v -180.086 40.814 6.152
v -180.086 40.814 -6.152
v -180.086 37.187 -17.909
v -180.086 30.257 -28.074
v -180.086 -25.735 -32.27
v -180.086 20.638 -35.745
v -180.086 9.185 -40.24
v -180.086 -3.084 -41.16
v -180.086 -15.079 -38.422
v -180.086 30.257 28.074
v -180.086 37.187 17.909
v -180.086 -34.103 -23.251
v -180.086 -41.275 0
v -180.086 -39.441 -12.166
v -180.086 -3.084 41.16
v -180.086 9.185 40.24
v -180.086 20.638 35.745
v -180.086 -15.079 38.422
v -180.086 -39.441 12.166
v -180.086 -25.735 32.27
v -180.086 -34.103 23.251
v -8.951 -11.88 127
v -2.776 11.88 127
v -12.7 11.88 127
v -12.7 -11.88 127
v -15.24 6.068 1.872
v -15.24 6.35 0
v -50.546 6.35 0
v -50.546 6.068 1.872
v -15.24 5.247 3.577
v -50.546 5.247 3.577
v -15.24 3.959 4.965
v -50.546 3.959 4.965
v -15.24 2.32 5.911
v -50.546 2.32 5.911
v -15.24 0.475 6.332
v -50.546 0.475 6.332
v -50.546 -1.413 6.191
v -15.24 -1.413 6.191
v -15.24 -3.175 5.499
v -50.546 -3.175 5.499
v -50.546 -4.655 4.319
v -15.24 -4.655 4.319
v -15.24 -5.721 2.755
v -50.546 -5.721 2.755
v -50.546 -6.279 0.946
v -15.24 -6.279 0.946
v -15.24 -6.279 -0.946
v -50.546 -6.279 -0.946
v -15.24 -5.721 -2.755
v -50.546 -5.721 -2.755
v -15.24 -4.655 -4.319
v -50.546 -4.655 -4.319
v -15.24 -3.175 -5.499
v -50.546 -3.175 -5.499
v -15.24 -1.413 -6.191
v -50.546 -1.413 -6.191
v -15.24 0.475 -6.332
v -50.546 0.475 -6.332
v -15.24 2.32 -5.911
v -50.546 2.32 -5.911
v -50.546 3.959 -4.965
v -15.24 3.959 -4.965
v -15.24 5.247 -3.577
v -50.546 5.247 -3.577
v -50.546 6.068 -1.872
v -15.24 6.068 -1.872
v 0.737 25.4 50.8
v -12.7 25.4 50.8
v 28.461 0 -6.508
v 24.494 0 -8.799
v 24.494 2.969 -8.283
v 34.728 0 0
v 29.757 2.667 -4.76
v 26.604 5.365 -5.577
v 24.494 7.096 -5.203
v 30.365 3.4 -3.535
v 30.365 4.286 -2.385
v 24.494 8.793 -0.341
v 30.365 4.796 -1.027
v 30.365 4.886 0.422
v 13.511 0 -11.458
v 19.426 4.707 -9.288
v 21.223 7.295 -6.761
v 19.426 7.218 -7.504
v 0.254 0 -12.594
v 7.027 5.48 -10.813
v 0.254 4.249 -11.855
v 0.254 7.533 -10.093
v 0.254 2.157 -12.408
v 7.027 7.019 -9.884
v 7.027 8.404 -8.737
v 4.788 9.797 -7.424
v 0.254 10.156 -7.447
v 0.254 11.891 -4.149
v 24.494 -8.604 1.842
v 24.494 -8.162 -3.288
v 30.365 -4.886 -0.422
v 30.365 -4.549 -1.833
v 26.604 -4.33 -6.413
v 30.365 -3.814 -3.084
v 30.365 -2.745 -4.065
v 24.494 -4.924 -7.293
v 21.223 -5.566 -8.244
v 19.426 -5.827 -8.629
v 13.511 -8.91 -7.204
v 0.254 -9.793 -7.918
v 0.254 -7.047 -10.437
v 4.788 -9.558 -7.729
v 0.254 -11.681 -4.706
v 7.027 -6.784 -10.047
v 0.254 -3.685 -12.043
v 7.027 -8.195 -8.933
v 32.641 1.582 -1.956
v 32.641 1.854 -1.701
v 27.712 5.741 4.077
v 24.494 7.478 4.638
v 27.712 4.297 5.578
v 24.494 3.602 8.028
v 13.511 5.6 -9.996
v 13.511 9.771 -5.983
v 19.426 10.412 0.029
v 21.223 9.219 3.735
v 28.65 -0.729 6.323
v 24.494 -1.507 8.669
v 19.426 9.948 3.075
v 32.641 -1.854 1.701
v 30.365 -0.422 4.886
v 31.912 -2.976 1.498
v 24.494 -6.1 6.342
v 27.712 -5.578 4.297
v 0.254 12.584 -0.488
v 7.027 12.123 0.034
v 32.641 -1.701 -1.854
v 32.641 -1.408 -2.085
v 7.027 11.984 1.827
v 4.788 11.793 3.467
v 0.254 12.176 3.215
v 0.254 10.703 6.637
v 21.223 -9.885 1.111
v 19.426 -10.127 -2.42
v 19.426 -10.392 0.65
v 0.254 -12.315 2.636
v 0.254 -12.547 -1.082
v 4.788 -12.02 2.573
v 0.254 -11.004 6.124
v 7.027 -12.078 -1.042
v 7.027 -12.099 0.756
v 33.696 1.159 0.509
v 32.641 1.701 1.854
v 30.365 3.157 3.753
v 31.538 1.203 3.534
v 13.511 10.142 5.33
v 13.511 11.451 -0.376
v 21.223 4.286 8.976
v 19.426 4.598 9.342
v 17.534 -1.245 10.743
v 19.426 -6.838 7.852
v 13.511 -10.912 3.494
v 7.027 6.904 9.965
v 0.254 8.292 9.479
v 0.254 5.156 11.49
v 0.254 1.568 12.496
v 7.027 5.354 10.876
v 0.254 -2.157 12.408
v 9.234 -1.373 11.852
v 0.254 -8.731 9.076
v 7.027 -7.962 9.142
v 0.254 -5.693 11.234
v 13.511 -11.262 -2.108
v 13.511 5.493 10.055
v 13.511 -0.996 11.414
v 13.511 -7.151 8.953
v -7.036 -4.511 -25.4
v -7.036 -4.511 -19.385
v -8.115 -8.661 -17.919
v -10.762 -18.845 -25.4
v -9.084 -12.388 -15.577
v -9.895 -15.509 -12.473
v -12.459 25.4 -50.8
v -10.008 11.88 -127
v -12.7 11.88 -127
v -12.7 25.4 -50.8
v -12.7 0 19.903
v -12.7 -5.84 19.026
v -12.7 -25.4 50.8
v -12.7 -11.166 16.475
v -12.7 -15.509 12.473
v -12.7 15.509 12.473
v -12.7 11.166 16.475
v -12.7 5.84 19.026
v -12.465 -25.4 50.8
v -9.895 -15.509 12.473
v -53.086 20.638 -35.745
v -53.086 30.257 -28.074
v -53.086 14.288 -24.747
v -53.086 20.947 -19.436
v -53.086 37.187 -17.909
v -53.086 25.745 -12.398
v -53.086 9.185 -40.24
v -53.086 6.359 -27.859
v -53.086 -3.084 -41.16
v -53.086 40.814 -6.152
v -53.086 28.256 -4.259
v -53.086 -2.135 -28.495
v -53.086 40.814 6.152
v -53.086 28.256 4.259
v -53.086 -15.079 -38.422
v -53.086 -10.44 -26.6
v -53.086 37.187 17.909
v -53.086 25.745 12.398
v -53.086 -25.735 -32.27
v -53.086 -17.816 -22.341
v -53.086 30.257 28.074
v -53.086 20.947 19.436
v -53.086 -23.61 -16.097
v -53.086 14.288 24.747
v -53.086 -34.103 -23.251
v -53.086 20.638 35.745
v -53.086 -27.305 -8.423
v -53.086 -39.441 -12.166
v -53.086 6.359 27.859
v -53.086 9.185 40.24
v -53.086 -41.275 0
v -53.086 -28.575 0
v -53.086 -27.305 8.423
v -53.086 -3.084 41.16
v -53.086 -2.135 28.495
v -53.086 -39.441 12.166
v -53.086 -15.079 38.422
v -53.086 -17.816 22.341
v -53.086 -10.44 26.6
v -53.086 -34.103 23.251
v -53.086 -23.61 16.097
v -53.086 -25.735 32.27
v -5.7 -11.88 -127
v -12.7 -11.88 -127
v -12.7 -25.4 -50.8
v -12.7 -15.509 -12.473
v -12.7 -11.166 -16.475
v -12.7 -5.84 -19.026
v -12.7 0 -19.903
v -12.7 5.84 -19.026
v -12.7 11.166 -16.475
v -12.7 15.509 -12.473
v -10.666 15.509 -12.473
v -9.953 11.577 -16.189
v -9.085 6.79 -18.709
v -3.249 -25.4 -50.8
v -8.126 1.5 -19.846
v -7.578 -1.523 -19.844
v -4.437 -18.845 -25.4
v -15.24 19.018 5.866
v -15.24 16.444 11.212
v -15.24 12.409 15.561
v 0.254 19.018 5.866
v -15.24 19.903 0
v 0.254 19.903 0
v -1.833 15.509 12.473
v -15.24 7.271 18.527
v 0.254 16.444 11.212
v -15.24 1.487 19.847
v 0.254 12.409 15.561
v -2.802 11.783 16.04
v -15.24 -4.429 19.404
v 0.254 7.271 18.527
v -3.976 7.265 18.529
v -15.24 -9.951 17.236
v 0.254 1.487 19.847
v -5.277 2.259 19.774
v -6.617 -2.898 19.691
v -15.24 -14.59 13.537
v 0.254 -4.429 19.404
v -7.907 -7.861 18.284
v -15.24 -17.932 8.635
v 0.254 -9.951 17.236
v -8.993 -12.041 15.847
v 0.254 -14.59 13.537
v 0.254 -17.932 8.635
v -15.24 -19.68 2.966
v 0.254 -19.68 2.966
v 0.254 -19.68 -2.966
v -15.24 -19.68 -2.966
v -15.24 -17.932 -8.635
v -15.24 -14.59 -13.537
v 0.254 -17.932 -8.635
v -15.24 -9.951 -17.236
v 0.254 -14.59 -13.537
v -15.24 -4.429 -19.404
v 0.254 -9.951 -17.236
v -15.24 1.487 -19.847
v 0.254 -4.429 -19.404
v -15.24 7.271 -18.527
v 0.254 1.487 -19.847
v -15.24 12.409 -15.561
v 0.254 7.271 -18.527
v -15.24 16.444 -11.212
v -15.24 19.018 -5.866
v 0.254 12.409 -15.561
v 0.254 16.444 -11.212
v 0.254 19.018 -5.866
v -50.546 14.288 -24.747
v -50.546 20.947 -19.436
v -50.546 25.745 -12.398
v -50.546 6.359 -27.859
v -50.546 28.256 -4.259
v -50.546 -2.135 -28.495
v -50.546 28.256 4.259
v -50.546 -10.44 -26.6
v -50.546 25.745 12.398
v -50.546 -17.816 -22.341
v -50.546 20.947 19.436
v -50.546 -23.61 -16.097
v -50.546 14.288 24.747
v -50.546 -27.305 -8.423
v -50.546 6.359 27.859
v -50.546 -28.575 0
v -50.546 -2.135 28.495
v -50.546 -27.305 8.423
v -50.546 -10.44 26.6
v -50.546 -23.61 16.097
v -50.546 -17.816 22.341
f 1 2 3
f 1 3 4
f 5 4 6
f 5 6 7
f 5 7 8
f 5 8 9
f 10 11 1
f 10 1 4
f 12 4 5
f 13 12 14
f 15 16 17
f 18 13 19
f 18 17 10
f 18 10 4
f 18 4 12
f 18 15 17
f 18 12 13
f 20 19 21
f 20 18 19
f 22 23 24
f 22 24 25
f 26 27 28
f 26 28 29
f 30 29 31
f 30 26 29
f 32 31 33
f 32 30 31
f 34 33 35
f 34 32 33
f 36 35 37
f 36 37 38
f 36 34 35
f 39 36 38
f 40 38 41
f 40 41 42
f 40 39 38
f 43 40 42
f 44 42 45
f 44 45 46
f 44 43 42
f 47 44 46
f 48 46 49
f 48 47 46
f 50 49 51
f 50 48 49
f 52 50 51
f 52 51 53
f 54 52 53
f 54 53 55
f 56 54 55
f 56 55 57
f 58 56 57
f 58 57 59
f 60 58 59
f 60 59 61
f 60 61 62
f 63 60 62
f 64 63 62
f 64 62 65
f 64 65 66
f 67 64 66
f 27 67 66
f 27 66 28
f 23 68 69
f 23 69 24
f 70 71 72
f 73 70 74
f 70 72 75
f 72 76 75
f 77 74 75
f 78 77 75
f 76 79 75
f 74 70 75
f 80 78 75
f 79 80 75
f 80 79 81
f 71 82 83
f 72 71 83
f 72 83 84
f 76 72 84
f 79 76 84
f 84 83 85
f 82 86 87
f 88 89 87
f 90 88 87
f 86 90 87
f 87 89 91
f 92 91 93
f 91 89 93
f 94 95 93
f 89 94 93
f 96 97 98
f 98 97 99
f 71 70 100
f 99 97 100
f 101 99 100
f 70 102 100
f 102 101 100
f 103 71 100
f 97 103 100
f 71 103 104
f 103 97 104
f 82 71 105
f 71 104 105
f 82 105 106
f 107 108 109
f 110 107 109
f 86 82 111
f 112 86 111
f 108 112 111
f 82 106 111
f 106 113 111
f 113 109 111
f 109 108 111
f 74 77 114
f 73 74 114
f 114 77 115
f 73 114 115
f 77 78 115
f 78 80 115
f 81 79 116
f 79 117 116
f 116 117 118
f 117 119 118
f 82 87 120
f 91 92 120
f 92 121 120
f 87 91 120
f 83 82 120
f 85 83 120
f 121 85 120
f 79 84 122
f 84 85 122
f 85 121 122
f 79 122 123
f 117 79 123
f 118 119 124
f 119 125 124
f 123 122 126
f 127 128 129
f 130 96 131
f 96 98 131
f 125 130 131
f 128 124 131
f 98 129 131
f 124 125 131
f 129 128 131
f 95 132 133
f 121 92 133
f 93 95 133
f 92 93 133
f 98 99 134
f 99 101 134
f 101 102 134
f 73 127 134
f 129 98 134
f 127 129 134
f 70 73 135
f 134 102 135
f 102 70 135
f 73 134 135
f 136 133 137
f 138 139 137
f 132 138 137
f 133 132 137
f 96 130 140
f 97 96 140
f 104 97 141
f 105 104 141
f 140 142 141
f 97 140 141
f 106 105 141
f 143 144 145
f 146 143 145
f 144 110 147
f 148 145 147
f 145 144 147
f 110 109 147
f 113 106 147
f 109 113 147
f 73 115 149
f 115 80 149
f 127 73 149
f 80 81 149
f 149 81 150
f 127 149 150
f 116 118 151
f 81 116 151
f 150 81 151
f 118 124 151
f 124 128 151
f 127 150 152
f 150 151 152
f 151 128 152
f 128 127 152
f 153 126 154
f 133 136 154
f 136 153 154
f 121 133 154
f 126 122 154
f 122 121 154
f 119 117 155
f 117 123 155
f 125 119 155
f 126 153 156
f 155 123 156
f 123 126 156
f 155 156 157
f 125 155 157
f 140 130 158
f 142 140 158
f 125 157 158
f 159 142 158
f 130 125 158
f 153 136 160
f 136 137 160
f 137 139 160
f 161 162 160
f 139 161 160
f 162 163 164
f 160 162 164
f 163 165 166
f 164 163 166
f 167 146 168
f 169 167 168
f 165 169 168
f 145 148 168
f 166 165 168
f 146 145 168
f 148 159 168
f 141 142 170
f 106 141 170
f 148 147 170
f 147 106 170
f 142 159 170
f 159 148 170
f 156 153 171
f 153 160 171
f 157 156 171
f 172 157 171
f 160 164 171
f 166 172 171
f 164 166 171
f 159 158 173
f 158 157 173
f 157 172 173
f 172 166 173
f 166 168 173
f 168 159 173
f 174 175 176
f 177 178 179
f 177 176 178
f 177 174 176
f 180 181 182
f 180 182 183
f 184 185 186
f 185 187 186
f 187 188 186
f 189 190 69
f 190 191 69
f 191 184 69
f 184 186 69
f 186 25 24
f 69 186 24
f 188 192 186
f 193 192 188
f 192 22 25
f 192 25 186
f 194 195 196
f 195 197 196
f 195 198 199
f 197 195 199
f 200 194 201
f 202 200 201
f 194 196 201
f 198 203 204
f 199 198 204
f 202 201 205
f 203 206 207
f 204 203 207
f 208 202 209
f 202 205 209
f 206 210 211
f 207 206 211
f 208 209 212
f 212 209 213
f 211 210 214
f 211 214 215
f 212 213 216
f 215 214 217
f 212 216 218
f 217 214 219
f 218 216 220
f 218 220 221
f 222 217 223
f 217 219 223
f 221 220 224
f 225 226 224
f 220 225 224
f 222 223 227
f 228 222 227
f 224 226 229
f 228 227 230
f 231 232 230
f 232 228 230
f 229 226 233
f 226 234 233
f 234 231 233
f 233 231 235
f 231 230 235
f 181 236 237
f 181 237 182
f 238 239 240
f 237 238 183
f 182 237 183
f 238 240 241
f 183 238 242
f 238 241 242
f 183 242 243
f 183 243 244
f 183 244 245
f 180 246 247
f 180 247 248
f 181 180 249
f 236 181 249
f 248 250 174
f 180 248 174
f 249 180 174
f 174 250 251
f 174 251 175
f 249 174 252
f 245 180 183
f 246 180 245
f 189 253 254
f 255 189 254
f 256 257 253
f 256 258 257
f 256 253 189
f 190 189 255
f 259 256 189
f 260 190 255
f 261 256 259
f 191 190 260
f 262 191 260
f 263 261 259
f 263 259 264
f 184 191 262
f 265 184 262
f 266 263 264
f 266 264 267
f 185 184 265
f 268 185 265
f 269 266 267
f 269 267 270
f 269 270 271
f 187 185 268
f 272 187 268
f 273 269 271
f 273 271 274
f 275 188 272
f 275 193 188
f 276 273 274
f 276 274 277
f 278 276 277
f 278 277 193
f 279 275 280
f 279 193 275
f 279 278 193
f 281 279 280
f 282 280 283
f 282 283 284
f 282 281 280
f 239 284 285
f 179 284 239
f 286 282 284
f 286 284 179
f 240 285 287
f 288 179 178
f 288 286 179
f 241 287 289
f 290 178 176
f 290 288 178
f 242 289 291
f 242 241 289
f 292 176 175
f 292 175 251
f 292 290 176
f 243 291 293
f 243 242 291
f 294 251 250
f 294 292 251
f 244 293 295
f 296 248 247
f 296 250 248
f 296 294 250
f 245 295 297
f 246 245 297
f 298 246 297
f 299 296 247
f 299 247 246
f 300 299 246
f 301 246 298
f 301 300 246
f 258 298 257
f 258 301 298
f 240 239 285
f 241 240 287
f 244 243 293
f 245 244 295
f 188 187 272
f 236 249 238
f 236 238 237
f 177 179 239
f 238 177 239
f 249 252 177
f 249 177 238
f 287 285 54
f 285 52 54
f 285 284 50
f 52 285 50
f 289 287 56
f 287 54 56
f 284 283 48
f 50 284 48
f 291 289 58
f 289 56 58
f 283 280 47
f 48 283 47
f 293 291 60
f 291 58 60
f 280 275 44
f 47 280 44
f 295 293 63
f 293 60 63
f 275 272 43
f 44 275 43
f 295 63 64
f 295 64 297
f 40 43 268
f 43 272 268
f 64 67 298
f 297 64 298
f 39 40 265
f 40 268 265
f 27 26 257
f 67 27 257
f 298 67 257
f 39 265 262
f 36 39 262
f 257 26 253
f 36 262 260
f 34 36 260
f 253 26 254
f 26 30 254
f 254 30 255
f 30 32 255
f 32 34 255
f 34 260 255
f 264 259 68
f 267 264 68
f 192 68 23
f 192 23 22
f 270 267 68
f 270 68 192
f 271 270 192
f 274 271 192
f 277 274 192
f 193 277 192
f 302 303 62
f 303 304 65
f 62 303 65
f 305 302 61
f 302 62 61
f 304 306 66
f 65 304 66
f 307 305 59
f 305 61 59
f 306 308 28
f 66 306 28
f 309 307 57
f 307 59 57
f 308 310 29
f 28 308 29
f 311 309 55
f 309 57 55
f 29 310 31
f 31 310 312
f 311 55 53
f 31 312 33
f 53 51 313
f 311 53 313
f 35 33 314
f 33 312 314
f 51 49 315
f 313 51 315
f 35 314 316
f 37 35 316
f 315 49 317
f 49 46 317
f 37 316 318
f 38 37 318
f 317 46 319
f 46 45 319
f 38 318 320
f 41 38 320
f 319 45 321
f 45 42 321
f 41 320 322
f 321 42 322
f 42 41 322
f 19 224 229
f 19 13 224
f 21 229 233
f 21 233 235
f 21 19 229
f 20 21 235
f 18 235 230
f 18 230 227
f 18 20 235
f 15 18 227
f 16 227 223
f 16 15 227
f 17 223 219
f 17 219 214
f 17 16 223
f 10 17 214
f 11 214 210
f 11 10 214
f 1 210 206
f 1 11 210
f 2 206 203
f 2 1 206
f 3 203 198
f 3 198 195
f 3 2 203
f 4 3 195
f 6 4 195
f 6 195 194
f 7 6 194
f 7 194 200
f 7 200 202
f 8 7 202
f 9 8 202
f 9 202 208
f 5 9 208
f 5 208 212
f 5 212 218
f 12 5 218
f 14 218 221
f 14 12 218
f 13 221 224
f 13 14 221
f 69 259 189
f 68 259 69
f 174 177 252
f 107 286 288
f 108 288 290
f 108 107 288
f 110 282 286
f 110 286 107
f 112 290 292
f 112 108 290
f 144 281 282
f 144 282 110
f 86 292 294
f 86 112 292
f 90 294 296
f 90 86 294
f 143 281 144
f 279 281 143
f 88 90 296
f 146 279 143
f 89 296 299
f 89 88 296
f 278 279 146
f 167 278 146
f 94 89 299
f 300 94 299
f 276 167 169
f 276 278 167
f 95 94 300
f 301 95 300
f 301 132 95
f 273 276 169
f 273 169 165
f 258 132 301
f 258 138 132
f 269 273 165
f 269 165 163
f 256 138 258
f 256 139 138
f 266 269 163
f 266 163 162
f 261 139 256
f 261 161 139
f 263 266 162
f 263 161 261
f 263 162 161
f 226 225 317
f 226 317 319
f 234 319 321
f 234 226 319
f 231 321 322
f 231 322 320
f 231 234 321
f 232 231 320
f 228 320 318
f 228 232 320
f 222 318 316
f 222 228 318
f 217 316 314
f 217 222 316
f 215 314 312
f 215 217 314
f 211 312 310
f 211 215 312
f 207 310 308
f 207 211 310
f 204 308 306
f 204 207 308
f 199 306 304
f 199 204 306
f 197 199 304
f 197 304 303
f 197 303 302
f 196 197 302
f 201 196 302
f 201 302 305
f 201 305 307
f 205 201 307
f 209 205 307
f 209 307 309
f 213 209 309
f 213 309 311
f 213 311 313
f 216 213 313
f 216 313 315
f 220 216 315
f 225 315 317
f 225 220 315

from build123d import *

# Parameters (mm, degrees)
F1_DEPTH       = 12.7
F3_DEPTH       = 254
F5_DEPTH       = 254
F5_DEPTH_BACK  = 25.4
F6_R           = 19.9026330237
F7_DEPTH       = 0.254
F7_DEPTH_BACK  = 15.24
F8_R           = 6.35
F9_DEPTH       = 25.4
F10_DEPTH      = 12.7
F10_DEPTH_BACK = 76.2
F11_R          = 28.575
F12_DEPTH      = 2.54
F12_DEPTH_BACK = 25.4
F13_R          = 41.275
F14_DEPTH      = 101.6
F14_DEPTH_BACK = 25.4


with BuildPart() as f1:
    # F0 (on Right) → F1 (new body, symmetric)
    with BuildSketch(Plane.YZ):
        with BuildLine():
            Line((-25.4, 50.8), (-15.24, 11.43))
            ThreePointArc((-15.24, 11.43), (-19.05, 0), (-15.24, -11.43))
            Line((-15.24, -11.43), (-25.4, -50.8))
            Line((-25.4, -50.8), (-11.8797372622, -127))
            Line((-11.8797372622, -127), (0, -127))
            Line((0, -127), (11.8797372622, -127))
            Line((11.8797372622, -127), (25.4, -50.8))
            Line((25.4, -50.8), (15.24, -11.43))
            ThreePointArc((15.24, -11.43), (19.05, 0), (15.24, 11.43))
            Line((15.24, 11.43), (25.4, 50.8))
            Line((25.4, 50.8), (11.8797372622, 127))
            Line((11.8797372622, 127), (0, 127))
            Line((0, 127), (-11.8797372622, 127))
            Line((-11.8797372622, 127), (-25.4, 50.8))
        make_face()
    extrude(amount=F1_DEPTH, both=True)

    # F2 (on Top) → F3 (cut)
    with BuildSketch(Plane.XY):
        Polygon((15.0384465232, 34.2237874866), (-14.059139771, 34.2237874866), (15.0384465232, -126.2663410758), align=None)
    extrude(amount=-F3_DEPTH, mode=Mode.SUBTRACT)

    # F4 (on Top) → F5 (cut, two sides)
    with BuildSketch(Plane.XY) as f5_sk:
        Polygon((7.2715352289, 50.541035831), (-13.9147825539, -30.9769567102), (33.8218561163, -30.9769567102), align=None)
    extrude(amount=F5_DEPTH, mode=Mode.SUBTRACT)
    extrude(f5_sk.sketch, amount=-F5_DEPTH_BACK, mode=Mode.SUBTRACT)

    # F6 (on Right) → F7 (join, two sides)
    with BuildSketch(Plane.YZ) as f7_sk:
        Circle(F6_R)
    extrude(amount=F7_DEPTH)
    extrude(f7_sk.sketch, amount=-F7_DEPTH_BACK)

    # F8 (on face) → F9 (cut)
    with BuildSketch(Plane.YZ.offset(0.254)):
        Circle(F8_R)
    extrude(amount=-F9_DEPTH, mode=Mode.SUBTRACT)

    # F8 (on face) → F10 (join, two sides)
    with BuildSketch(Plane.YZ.offset(0.254)) as f10_sk:
        Circle(F8_R)
    extrude(amount=F10_DEPTH)
    extrude(f10_sk.sketch, amount=-F10_DEPTH_BACK)

    # F11 (on face) → F12 (join, two sides)
    with BuildSketch(Plane(origin=(-75.946, 0, 0), x_dir=(0, -1, 0), z_dir=(-1, 0, 0))) as f12_sk:
        Circle(F11_R)
    extrude(amount=F12_DEPTH)
    extrude(f12_sk.sketch, amount=-F12_DEPTH_BACK)

    # F13 (on face) → F14 (join, two sides)
    with BuildSketch(Plane(origin=(-78.486, 0, 0), x_dir=(0, -1, 0), z_dir=(-1, 0, 0))) as f14_sk:
        Circle(F13_R)
    extrude(amount=F14_DEPTH)
    extrude(f14_sk.sketch, amount=-F14_DEPTH_BACK)

    # F15 (on Front) → F16 (revolve)
    with BuildSketch(Plane.XZ):
        with BuildLine():
            Line((34.7278043628, 0), (0, 0))
            Line((0, 0), (0, -12.609985657))
            add(Edge.make_bspline(
                [(34.7278043628, 0), (32.128238571, -3.207452008), (25.8473025253, -10.9571312029), (9.5513516448, -11.9992064822), (0, -12.609985657)],
                knots=[0, 0, 0, 0, 0.4138819075, 1, 1, 1, 1], degree=3))
        make_face()
    revolve(axis=Axis((17.3639021814, 0, 0), (1, 0, 0)))


solid = f1.part
